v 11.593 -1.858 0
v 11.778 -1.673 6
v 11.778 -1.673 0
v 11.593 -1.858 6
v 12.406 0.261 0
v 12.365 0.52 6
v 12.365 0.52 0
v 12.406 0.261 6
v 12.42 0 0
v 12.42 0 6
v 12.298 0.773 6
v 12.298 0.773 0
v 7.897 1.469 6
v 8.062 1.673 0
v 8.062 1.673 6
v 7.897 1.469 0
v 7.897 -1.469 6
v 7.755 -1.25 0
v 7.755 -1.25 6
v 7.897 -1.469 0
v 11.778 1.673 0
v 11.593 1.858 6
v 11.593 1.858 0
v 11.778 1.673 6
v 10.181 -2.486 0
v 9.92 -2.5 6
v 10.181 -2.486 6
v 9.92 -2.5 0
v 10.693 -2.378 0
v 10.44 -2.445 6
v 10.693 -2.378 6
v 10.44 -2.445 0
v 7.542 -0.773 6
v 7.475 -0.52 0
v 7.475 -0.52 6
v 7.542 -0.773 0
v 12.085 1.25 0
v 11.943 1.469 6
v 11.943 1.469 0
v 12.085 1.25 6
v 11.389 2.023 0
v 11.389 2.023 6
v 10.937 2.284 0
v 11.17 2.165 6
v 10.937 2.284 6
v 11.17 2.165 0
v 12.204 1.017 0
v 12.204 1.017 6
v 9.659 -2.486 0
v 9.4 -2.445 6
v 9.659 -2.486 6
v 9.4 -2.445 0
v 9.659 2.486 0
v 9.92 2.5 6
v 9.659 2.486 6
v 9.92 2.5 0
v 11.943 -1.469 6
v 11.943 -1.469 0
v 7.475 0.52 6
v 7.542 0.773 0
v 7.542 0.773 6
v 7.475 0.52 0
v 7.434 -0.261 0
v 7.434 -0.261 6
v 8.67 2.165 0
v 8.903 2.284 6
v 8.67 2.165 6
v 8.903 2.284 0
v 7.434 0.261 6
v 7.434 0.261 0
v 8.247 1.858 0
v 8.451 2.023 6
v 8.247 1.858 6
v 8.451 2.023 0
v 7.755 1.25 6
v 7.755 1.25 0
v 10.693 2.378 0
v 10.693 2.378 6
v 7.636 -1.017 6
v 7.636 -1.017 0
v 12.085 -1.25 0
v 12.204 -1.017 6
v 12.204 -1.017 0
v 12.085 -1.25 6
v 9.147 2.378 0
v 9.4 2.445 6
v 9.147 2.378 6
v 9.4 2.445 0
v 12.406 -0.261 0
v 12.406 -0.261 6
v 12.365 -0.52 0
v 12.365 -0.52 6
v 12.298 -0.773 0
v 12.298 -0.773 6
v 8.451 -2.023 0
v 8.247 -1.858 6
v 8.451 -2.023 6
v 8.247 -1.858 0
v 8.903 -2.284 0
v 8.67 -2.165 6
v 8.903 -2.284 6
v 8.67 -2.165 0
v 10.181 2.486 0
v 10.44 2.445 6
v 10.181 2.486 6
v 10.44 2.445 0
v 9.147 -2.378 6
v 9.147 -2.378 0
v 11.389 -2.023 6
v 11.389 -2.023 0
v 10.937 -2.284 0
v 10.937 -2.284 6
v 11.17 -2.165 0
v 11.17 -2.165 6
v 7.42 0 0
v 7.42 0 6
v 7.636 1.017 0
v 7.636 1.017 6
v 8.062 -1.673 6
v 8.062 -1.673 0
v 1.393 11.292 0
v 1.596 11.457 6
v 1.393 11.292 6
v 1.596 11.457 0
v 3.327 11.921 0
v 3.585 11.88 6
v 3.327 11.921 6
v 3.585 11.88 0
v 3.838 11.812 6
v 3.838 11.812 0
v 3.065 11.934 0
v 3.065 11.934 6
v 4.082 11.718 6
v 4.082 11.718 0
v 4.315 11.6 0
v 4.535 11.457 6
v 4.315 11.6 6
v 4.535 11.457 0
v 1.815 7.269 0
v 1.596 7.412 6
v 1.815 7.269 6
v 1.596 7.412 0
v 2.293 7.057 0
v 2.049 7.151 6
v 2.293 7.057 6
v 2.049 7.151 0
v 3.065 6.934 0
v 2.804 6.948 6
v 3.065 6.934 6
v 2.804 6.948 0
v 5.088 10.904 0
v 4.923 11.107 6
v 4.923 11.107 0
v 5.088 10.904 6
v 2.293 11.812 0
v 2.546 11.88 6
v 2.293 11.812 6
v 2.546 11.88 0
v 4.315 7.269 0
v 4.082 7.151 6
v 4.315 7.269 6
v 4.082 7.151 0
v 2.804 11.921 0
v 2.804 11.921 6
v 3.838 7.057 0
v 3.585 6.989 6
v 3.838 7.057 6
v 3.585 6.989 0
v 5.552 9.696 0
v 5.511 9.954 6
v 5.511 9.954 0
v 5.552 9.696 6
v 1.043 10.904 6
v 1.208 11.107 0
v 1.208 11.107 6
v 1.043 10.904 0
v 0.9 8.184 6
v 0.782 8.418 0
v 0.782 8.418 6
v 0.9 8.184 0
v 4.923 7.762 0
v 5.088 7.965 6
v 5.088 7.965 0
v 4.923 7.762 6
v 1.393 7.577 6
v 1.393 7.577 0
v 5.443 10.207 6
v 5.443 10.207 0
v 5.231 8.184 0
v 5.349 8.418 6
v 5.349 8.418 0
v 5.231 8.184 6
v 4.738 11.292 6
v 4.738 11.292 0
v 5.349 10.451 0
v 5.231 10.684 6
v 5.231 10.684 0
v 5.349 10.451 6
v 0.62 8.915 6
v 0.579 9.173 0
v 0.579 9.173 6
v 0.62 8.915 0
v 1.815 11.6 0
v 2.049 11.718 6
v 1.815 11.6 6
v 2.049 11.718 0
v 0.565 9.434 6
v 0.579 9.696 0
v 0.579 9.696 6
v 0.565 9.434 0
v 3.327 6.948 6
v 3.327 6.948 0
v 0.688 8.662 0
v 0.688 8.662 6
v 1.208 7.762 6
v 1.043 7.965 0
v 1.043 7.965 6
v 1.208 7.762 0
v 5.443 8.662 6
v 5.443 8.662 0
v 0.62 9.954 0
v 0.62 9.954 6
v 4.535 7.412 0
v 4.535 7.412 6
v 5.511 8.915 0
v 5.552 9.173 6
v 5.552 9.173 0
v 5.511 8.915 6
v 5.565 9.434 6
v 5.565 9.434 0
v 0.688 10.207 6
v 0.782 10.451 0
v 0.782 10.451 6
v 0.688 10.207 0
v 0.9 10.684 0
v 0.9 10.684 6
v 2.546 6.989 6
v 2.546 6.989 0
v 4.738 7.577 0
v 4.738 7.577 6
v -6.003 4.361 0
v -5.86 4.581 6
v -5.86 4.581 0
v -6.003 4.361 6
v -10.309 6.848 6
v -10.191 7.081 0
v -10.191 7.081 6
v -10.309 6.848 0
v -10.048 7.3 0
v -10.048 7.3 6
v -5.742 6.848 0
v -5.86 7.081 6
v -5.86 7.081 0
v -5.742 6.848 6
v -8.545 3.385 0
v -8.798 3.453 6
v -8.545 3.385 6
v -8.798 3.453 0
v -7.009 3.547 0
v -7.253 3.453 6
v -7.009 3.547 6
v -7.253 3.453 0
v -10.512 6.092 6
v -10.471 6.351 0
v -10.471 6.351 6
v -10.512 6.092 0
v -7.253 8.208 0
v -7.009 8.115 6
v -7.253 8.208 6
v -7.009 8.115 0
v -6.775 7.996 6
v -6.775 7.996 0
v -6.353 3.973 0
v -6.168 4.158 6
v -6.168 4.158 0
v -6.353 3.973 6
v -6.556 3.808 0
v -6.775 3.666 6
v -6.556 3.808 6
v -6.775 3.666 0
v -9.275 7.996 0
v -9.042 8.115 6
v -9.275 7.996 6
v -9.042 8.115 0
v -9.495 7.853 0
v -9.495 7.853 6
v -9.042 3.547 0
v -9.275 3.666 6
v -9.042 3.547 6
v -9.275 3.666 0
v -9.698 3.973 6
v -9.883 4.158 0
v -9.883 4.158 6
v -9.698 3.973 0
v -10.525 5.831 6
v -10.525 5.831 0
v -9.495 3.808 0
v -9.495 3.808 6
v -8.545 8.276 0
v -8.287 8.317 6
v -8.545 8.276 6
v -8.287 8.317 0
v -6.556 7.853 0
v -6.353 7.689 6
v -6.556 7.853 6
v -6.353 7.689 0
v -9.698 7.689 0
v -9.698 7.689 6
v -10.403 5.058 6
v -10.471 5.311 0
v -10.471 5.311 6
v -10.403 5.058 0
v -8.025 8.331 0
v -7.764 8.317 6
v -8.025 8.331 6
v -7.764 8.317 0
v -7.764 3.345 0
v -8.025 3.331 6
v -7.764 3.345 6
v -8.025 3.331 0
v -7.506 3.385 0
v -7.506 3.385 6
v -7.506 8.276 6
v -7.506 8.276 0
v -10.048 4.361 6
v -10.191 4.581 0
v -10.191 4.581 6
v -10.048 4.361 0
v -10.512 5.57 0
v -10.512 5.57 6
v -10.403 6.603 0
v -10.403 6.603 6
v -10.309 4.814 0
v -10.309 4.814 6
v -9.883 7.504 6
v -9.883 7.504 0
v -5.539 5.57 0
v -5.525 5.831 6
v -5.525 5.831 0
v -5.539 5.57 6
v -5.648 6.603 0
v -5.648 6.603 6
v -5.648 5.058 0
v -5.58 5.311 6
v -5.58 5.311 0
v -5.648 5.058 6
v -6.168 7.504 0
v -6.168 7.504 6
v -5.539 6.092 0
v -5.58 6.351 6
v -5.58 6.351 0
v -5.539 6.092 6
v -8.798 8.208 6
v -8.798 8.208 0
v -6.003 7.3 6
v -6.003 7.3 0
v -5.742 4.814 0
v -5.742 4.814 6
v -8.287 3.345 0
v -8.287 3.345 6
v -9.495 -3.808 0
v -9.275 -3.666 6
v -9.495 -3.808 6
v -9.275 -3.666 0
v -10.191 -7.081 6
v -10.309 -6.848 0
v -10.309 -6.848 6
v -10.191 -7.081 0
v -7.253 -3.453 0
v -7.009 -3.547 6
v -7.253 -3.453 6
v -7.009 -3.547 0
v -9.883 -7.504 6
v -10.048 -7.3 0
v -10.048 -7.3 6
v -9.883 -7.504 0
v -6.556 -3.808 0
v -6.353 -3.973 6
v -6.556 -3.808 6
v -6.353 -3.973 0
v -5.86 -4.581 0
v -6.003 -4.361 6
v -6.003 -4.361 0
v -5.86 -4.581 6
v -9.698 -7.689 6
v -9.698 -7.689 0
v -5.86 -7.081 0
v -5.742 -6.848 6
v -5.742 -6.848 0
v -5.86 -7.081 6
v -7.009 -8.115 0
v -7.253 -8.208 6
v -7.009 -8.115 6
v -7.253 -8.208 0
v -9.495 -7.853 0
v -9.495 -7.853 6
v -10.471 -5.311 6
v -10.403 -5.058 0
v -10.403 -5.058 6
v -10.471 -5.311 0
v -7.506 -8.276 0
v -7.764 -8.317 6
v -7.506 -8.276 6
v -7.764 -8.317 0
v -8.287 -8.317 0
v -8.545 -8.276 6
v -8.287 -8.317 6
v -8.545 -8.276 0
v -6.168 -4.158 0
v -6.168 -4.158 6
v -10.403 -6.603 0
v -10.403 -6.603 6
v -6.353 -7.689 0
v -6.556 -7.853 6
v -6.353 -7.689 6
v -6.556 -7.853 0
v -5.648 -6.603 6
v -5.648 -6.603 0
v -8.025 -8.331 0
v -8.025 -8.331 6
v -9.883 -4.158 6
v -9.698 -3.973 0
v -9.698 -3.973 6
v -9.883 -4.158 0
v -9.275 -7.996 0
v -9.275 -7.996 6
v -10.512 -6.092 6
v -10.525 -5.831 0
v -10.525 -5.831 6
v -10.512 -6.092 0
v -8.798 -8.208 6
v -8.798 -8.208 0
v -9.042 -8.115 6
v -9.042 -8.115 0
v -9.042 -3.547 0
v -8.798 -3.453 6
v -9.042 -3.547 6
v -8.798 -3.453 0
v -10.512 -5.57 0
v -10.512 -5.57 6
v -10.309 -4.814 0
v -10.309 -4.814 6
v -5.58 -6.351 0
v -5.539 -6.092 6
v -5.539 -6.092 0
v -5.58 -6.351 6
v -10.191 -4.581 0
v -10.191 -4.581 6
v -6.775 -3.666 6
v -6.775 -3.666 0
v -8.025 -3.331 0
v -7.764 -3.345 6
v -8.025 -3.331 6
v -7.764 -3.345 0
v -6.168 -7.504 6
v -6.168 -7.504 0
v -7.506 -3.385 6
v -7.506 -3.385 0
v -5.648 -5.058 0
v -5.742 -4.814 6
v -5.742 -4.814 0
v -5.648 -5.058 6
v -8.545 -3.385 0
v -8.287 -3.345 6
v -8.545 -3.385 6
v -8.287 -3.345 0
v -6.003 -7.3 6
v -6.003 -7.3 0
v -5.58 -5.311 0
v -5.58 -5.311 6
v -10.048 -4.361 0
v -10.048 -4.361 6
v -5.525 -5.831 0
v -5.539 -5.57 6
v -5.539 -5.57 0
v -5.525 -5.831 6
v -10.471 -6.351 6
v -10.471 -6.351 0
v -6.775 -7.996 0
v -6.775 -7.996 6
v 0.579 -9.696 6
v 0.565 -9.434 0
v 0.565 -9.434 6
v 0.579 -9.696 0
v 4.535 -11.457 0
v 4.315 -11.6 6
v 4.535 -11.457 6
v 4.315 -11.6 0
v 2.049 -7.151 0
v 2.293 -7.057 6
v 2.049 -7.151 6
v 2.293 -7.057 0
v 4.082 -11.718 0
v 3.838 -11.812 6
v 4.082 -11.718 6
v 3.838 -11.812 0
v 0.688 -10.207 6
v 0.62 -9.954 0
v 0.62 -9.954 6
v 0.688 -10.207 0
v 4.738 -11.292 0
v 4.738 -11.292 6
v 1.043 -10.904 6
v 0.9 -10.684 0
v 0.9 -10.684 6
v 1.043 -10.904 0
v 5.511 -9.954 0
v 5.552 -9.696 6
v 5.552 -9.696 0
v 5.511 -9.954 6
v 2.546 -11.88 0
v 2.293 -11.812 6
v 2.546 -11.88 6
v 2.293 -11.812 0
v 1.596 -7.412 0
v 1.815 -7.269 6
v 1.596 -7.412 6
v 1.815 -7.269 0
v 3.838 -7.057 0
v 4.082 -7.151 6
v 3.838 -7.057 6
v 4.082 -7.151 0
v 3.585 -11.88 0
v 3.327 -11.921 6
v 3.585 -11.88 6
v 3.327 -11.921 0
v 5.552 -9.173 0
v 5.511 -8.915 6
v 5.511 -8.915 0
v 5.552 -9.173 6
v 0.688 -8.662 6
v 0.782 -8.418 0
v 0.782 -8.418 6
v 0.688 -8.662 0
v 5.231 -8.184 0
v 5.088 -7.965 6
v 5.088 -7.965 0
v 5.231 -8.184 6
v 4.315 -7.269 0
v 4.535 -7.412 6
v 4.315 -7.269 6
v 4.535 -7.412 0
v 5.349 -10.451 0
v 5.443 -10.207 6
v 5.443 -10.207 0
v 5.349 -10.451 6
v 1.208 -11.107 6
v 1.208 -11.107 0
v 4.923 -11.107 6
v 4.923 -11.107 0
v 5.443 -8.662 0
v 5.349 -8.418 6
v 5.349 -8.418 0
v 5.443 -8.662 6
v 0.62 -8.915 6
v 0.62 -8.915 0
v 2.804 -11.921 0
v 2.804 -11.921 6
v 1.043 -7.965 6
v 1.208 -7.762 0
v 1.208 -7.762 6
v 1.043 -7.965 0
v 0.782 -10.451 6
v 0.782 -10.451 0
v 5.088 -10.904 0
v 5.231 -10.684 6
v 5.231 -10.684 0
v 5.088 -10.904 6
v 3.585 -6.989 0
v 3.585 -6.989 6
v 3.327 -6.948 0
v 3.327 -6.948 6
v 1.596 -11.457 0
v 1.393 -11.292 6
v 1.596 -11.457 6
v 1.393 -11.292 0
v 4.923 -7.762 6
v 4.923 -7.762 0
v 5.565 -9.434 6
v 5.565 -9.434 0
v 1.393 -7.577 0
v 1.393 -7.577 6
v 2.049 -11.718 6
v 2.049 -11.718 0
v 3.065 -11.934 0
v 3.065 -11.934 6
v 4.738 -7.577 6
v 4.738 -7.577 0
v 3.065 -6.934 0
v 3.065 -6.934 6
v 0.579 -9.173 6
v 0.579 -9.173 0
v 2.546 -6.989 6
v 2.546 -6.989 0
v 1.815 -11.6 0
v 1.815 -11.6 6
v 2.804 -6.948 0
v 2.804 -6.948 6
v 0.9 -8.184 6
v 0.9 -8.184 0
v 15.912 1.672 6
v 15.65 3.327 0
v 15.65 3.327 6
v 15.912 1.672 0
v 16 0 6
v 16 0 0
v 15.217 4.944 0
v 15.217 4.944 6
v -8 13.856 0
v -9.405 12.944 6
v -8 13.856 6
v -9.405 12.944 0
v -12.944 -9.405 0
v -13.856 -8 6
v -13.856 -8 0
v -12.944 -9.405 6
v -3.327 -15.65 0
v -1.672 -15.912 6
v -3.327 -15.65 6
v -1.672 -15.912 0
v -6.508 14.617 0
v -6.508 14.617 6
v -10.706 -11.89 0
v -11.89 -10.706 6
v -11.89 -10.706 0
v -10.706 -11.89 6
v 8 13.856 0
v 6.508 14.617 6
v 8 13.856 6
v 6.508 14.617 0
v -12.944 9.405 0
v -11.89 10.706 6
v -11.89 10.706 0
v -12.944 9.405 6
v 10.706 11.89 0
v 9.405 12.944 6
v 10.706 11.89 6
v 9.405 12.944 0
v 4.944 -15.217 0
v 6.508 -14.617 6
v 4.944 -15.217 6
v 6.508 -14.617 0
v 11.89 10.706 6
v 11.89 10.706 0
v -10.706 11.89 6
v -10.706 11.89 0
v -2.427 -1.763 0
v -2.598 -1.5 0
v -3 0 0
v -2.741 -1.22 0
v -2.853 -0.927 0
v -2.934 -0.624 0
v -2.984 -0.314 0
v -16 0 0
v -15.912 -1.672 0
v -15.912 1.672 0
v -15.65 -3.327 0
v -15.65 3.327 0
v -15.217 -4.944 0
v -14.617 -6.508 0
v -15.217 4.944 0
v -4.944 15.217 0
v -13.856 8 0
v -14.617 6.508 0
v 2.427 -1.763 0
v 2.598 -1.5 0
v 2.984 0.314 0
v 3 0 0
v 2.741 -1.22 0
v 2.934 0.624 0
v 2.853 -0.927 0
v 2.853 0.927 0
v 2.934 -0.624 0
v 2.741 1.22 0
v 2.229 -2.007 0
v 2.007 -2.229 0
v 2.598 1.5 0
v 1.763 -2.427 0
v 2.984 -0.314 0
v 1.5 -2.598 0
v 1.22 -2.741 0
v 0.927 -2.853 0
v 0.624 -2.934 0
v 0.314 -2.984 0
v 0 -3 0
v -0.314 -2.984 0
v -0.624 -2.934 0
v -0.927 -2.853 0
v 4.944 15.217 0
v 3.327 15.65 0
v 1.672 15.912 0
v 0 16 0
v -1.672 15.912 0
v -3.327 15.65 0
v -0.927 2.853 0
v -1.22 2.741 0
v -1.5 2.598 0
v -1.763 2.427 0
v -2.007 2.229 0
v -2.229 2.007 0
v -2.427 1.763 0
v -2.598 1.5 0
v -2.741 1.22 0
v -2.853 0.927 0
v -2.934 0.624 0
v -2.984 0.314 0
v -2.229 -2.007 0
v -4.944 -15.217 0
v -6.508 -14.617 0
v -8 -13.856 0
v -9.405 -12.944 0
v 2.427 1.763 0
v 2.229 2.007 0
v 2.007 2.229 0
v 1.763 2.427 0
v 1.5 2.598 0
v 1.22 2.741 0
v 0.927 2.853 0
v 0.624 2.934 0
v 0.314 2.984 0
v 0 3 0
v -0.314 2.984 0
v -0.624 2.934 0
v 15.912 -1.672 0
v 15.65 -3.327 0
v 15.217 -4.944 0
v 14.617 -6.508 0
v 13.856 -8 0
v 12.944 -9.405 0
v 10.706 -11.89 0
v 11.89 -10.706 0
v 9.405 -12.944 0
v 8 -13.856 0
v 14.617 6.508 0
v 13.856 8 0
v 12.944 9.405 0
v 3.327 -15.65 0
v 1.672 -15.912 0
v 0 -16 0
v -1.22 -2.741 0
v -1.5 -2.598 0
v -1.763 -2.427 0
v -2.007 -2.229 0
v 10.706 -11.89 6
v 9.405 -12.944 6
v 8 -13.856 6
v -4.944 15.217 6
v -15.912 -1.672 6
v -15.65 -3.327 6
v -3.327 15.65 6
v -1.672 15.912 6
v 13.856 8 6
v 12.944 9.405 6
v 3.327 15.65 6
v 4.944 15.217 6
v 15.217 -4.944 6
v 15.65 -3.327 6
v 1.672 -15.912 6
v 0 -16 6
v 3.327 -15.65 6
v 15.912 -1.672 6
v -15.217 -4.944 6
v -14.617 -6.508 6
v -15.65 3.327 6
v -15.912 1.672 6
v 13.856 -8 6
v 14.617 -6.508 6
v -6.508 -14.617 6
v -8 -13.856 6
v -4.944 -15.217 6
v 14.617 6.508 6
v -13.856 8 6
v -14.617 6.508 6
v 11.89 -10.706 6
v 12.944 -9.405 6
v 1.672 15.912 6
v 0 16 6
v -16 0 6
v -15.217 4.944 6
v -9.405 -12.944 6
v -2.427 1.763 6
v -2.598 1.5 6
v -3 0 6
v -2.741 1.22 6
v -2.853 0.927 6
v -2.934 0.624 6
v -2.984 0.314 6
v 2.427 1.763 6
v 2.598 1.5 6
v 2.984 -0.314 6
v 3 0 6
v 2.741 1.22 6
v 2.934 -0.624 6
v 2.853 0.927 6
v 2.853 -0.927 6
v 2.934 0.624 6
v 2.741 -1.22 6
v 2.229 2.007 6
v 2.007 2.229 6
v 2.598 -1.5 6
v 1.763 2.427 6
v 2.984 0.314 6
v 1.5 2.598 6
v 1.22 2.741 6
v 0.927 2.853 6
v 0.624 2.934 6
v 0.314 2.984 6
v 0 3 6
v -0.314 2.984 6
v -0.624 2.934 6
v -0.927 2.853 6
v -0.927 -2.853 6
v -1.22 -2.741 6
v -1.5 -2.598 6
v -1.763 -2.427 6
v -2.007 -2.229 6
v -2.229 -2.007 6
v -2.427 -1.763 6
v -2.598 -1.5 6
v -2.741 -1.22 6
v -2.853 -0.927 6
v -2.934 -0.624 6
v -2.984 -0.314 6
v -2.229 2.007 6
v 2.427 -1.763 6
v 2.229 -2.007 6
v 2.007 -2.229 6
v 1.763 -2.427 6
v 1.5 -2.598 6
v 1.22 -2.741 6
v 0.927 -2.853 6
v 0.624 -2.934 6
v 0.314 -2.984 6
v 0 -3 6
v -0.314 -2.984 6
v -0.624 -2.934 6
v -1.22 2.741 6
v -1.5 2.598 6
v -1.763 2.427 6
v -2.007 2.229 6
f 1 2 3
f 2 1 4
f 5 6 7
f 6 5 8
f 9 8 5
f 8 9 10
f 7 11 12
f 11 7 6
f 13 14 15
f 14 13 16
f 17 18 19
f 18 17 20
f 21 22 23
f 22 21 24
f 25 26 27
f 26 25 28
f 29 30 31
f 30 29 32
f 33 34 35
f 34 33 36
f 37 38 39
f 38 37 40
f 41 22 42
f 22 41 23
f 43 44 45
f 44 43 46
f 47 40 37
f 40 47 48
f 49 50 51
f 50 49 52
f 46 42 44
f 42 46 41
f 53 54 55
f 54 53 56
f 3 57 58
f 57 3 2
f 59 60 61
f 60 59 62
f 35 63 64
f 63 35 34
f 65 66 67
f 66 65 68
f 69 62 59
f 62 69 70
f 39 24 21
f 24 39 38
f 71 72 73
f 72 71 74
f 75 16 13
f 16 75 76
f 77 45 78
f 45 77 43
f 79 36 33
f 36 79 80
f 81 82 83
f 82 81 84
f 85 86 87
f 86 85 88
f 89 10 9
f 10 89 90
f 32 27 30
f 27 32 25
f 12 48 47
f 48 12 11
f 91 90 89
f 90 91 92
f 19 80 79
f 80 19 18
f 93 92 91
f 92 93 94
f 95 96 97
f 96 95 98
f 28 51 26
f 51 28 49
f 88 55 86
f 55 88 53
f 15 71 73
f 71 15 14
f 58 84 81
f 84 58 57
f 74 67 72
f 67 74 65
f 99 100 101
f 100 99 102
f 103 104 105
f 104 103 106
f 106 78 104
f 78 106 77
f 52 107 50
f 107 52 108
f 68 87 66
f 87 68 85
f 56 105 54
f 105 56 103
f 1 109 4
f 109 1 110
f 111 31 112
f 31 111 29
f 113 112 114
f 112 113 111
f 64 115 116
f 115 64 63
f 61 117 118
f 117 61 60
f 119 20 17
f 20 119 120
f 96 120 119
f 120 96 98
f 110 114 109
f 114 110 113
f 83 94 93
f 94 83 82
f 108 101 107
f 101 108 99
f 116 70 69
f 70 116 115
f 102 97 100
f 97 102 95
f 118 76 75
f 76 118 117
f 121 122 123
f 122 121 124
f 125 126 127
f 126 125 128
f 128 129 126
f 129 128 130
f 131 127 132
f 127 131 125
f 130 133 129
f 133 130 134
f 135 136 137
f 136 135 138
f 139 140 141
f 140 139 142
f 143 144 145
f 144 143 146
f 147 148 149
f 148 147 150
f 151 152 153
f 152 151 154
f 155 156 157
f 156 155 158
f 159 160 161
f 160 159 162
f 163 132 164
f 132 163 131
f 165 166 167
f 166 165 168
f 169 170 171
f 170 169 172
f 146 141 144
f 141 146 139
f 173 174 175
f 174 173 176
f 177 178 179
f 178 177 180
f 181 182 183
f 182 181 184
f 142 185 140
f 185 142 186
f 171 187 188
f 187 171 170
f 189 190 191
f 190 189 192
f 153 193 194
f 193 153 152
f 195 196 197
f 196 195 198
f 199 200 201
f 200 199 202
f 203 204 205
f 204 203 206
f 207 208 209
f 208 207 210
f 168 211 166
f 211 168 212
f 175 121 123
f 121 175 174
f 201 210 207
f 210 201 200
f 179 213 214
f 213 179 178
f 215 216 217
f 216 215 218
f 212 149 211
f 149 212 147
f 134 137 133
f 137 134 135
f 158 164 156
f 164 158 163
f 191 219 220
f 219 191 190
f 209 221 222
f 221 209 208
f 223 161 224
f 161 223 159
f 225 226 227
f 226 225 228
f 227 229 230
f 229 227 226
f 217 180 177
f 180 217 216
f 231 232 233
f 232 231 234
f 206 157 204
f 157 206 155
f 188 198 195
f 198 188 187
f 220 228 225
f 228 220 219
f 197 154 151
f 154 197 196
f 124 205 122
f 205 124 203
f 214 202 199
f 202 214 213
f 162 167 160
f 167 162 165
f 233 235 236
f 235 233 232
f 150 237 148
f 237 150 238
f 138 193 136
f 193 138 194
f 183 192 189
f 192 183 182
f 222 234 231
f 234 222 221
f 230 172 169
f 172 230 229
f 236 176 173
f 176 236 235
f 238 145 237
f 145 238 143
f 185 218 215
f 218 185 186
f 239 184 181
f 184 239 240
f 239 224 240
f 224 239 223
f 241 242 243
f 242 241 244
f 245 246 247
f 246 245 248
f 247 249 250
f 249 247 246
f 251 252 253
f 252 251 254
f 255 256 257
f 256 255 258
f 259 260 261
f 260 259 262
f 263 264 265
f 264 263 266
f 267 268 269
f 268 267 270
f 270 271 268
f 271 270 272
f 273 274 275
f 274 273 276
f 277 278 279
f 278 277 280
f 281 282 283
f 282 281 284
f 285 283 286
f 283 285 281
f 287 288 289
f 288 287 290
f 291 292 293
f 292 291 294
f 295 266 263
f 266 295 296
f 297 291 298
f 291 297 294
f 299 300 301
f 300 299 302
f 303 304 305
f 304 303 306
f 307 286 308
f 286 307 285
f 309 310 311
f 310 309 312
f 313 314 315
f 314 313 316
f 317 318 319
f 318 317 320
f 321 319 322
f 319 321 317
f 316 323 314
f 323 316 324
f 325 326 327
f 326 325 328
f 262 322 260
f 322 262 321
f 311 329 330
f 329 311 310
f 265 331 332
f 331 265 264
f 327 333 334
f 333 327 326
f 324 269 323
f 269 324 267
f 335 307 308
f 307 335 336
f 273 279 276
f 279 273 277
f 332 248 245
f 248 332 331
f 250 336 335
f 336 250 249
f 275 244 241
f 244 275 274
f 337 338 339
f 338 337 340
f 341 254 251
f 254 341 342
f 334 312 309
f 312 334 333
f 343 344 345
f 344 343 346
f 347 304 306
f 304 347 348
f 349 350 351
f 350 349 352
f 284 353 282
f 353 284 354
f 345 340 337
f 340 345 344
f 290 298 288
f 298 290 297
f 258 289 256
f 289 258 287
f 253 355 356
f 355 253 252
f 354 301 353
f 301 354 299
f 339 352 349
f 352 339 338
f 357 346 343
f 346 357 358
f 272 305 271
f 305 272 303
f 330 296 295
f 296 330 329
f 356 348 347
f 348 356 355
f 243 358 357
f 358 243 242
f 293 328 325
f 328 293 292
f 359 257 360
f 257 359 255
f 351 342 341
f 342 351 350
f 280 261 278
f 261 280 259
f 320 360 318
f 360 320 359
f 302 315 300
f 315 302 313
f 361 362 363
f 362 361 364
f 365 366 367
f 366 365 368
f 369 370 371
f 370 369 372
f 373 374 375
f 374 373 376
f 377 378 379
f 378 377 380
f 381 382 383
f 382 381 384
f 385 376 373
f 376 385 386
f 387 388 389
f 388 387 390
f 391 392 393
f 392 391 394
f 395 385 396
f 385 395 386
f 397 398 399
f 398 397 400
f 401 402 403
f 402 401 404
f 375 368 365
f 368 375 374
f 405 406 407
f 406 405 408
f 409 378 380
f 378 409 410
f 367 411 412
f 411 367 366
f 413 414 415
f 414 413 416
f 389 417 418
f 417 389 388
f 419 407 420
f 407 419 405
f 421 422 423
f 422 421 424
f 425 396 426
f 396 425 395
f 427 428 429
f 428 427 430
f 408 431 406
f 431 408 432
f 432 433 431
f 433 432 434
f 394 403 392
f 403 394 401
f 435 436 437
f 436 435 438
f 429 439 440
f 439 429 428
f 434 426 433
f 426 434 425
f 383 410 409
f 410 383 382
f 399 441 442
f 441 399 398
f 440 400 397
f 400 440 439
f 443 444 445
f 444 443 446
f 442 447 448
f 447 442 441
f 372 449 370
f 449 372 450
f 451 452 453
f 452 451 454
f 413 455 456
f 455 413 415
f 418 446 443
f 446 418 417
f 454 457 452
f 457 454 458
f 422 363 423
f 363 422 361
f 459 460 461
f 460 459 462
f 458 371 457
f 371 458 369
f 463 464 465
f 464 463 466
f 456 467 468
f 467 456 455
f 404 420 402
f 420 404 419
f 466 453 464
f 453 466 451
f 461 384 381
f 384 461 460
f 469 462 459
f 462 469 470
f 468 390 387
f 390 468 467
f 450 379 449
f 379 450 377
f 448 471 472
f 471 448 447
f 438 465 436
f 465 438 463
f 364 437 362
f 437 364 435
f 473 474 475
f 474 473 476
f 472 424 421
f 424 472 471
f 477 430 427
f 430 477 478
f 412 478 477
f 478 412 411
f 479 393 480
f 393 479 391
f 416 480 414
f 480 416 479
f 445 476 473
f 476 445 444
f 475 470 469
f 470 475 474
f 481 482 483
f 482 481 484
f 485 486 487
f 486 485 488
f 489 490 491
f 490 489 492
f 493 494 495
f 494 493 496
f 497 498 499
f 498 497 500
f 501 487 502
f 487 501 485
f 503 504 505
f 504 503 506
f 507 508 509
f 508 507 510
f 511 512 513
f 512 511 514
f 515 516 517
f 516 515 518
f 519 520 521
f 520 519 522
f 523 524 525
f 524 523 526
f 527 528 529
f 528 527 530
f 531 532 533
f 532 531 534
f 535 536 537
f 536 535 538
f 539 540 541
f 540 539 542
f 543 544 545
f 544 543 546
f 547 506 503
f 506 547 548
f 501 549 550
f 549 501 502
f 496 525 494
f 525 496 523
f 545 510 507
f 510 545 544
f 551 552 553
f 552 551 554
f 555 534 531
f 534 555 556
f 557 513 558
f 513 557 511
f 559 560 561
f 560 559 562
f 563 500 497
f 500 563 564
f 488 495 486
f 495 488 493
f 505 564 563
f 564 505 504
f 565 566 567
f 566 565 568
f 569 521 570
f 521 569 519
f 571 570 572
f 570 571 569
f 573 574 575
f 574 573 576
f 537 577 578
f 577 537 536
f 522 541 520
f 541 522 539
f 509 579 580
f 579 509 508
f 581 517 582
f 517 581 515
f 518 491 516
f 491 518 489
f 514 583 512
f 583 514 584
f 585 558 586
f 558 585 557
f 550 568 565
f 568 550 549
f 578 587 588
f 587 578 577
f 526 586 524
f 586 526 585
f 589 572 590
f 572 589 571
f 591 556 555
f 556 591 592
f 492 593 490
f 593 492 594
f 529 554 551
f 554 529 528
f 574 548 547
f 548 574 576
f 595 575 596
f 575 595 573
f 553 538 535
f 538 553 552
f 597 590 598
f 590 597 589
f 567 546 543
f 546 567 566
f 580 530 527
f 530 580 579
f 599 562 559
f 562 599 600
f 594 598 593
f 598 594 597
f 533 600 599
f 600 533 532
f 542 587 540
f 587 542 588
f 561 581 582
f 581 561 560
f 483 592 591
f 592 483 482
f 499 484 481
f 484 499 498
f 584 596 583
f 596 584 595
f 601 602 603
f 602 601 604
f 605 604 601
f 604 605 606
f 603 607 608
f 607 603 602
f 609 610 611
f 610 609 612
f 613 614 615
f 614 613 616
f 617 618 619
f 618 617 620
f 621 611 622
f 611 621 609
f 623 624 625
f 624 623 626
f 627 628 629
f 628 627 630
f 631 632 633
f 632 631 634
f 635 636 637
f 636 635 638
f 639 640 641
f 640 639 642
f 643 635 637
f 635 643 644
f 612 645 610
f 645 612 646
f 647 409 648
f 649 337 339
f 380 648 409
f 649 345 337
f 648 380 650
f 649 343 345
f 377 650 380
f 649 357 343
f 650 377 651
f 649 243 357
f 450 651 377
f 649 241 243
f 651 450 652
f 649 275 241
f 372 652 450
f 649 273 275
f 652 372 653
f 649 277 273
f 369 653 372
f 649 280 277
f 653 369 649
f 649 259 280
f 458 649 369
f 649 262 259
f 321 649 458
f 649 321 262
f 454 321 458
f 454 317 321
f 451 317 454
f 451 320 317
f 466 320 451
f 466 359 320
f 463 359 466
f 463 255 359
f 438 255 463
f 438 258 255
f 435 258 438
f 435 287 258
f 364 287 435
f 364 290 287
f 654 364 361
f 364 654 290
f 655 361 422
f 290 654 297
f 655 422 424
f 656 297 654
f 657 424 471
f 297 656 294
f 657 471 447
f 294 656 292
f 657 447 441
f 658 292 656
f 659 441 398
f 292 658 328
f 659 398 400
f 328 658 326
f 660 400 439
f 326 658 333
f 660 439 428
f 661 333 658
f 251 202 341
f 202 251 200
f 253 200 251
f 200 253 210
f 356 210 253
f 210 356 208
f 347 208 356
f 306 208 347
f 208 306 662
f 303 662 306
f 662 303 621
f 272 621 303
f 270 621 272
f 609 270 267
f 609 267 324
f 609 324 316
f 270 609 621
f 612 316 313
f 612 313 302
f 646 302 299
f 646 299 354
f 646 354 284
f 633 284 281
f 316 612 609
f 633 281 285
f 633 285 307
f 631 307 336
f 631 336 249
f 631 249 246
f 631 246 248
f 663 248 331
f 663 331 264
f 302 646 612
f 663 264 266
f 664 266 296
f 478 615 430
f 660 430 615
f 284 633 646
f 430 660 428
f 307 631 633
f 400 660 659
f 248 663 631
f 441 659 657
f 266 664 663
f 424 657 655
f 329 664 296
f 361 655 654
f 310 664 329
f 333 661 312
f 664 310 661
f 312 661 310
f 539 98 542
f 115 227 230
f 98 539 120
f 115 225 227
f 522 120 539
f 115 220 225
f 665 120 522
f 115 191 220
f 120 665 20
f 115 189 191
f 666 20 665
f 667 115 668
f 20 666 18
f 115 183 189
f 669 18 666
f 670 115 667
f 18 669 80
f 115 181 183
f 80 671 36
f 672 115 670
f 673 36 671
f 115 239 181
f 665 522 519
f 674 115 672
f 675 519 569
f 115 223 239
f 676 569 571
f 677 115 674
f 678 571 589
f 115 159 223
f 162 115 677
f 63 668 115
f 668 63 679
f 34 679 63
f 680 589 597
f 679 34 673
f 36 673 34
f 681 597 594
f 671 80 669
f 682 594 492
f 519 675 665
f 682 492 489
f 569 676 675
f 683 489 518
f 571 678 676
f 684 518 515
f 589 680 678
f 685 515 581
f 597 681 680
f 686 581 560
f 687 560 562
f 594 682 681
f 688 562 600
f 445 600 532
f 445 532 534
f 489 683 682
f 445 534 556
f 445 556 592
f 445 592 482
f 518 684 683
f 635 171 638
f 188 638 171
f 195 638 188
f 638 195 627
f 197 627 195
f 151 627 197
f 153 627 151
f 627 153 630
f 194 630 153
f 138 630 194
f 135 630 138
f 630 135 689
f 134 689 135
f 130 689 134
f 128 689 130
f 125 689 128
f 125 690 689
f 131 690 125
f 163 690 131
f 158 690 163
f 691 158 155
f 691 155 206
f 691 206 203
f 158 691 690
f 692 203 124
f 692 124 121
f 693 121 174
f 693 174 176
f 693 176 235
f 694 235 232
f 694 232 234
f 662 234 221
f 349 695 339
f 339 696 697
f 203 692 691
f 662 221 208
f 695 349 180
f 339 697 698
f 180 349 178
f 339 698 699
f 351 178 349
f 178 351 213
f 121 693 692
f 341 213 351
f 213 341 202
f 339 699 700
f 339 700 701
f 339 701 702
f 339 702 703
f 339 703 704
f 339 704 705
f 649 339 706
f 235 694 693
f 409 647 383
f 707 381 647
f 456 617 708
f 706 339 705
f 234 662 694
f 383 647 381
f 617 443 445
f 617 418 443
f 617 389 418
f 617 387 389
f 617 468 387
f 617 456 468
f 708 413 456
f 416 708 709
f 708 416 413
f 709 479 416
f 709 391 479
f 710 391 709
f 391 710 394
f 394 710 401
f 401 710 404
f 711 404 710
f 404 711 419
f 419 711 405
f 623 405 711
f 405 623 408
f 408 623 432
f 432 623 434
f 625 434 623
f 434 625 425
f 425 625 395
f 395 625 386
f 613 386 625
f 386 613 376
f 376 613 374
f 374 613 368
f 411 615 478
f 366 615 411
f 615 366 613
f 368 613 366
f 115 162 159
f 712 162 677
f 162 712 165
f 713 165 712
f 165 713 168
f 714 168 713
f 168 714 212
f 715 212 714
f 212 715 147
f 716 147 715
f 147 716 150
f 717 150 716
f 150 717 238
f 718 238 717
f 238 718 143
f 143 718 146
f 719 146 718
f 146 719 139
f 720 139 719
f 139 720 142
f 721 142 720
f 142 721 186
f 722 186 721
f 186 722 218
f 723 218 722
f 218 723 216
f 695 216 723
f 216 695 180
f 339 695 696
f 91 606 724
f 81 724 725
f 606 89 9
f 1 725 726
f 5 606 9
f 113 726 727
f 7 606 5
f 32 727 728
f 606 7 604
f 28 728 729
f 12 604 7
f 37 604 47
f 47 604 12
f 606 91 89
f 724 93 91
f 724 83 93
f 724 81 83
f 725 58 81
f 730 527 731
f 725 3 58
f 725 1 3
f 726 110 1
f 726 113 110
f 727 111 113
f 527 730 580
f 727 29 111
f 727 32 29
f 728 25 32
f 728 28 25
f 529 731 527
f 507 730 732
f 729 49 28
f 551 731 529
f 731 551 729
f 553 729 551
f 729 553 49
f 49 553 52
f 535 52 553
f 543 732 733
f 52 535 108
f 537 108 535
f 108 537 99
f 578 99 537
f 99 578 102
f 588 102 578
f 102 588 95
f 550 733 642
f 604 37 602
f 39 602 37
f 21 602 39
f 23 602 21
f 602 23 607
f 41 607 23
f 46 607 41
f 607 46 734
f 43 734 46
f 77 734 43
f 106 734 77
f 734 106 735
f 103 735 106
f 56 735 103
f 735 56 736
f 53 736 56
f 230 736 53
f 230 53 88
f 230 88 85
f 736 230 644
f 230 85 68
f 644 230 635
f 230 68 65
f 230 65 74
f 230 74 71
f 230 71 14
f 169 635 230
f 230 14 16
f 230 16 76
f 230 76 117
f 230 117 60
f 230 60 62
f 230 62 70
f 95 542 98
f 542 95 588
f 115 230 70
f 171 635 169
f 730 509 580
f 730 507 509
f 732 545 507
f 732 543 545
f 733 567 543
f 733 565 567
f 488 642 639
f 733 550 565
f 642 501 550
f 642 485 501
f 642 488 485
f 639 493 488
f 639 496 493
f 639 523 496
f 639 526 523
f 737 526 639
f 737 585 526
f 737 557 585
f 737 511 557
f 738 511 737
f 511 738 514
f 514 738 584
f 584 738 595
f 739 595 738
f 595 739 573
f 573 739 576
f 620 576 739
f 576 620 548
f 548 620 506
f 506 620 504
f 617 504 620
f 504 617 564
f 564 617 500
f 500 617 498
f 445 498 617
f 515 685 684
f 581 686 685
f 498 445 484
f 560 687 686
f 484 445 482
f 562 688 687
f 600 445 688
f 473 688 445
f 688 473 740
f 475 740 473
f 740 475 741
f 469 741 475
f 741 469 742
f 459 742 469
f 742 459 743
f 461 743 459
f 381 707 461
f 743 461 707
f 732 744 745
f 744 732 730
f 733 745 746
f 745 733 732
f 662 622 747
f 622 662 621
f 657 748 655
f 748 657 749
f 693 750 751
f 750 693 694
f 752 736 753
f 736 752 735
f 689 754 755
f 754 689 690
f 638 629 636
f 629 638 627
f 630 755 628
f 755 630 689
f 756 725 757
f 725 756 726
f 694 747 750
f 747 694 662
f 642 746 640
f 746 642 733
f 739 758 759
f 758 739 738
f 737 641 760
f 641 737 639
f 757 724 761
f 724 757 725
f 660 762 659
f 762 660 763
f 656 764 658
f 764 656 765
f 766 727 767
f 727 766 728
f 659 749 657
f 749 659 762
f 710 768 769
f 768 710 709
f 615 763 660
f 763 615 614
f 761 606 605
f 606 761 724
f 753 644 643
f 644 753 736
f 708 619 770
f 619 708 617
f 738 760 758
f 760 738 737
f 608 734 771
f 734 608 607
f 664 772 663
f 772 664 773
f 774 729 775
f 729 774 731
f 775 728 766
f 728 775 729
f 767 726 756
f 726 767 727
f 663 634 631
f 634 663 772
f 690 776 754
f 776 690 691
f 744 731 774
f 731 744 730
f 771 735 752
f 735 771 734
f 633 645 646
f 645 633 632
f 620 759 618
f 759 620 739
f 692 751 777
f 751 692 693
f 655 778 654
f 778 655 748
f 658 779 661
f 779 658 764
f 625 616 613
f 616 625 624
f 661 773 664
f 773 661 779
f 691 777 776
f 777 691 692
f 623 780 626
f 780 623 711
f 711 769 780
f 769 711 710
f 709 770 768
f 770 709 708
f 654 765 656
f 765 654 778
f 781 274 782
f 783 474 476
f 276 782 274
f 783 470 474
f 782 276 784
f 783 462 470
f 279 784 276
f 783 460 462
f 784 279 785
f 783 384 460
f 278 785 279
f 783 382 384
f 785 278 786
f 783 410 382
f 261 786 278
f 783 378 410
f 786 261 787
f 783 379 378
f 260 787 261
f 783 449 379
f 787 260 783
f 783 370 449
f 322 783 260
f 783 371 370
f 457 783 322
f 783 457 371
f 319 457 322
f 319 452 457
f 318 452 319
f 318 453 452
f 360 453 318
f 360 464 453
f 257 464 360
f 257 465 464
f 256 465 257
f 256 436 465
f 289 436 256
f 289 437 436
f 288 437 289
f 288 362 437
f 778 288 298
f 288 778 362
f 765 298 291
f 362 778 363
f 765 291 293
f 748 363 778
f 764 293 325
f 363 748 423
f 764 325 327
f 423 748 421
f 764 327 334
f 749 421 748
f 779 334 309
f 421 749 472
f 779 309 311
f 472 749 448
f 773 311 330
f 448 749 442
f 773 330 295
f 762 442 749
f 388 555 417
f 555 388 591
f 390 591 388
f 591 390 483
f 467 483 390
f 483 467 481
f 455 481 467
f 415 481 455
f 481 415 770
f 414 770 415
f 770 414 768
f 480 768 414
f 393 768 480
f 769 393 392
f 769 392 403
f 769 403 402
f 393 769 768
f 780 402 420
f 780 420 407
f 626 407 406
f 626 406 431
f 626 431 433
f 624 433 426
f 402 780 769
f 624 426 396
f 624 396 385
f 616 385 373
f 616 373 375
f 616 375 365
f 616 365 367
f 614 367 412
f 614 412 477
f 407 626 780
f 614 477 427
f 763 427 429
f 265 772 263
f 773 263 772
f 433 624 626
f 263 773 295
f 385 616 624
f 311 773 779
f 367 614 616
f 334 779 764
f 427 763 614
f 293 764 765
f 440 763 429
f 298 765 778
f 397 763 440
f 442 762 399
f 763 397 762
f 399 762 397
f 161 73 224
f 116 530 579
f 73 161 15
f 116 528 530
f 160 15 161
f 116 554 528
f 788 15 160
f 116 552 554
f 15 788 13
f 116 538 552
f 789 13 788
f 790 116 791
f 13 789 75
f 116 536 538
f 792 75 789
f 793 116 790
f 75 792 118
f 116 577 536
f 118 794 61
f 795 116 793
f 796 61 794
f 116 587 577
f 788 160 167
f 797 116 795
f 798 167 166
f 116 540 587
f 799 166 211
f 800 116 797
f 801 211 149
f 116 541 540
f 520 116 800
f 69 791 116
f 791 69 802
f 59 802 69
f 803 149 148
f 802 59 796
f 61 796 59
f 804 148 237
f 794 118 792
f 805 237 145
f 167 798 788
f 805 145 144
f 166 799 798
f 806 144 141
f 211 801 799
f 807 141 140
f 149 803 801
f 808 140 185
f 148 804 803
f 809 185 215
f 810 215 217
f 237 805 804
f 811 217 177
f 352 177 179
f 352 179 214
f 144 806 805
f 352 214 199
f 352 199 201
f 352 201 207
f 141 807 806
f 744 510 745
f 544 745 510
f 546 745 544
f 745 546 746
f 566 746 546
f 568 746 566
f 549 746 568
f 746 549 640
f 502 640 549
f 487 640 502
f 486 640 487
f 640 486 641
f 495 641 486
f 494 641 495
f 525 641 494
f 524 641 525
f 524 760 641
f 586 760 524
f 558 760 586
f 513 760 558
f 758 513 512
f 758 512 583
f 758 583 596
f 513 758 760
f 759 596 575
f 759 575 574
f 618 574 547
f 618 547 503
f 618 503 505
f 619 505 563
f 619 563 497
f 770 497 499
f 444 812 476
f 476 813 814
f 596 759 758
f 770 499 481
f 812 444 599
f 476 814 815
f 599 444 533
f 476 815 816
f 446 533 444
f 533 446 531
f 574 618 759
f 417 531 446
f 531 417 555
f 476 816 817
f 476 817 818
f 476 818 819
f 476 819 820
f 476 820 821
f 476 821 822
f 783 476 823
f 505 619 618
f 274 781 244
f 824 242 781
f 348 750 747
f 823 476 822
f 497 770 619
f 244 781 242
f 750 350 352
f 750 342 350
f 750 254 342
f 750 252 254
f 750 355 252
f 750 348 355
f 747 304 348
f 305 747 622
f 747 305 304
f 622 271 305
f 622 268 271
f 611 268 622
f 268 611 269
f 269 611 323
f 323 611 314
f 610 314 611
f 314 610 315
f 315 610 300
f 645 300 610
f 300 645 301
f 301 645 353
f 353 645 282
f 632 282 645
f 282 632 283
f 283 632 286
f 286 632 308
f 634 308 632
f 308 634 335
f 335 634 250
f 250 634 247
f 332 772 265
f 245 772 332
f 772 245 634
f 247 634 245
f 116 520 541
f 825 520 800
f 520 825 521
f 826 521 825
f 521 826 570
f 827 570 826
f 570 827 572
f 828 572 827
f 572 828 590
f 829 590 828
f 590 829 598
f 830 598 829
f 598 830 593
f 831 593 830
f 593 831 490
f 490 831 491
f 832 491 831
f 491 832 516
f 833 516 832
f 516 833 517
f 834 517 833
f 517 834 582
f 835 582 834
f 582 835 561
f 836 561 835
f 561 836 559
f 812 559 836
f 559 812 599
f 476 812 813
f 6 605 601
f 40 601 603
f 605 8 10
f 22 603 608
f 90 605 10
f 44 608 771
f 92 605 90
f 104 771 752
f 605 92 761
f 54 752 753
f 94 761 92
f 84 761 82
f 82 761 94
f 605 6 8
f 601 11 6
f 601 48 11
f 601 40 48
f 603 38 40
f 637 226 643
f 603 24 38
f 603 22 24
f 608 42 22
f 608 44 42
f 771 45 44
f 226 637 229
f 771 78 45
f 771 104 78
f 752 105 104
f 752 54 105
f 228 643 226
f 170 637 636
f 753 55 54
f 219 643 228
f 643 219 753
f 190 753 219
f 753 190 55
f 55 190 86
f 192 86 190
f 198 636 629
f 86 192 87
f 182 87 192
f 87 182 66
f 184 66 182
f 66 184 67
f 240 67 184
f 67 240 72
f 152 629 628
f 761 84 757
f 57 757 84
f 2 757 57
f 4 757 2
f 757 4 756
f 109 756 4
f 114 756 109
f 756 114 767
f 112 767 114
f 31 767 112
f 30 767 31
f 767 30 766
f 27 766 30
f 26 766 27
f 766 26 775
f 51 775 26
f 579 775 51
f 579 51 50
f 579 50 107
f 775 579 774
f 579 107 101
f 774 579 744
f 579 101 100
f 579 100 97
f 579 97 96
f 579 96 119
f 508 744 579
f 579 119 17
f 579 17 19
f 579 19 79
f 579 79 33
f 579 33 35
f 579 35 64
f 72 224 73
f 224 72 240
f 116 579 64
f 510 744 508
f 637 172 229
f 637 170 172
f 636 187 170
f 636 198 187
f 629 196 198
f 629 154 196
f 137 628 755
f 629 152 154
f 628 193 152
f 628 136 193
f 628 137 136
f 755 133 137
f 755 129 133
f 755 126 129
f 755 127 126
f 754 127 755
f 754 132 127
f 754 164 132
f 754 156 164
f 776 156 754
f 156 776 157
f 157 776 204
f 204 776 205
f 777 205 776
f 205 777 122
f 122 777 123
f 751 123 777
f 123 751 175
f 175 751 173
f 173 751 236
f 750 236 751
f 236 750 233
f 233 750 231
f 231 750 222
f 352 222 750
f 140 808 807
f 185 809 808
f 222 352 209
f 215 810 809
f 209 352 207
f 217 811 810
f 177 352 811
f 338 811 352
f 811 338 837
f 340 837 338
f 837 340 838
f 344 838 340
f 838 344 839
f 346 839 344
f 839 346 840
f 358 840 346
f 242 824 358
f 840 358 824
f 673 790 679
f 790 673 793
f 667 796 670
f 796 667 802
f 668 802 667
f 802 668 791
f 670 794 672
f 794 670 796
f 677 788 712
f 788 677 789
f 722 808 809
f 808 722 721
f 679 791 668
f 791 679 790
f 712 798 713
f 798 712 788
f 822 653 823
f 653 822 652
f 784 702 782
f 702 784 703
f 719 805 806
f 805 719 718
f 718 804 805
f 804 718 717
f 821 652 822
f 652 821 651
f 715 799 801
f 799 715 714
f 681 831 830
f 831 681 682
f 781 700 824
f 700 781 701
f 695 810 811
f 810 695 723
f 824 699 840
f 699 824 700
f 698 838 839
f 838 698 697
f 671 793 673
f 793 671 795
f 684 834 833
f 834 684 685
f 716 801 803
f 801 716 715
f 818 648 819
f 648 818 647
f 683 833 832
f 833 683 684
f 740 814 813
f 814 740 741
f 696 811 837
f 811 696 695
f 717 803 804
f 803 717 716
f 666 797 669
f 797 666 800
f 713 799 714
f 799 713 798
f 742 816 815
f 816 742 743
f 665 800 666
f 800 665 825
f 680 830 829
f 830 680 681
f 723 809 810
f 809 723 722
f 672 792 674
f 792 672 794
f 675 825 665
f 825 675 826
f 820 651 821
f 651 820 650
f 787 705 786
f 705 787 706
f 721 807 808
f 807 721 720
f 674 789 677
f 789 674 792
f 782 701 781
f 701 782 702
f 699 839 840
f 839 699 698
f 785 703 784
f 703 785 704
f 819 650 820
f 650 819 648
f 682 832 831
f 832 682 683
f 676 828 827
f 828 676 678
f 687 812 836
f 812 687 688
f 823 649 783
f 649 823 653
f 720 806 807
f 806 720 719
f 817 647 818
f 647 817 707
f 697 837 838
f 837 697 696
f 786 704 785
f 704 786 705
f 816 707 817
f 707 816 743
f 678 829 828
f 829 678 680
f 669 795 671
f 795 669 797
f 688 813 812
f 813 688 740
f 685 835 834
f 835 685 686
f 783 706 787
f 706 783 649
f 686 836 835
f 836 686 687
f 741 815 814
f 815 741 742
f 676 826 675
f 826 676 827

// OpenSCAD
// Lightweight sprocket blank.
$fn = 60;
eps = 0.02;
bore_d = 6;
outer_d = 32;
spoke_holes = 5;
thickness = 6;
difference() { cylinder(d=outer_d,h=thickness); translate([0,0,-eps]) cylinder(d=bore_d,h=thickness+2*eps); for(i=[0:spoke_holes-1]) rotate([0,0,i*360/spoke_holes]) translate([outer_d*0.31,0,-eps]) cylinder(d=5,h=thickness+2*eps); }
